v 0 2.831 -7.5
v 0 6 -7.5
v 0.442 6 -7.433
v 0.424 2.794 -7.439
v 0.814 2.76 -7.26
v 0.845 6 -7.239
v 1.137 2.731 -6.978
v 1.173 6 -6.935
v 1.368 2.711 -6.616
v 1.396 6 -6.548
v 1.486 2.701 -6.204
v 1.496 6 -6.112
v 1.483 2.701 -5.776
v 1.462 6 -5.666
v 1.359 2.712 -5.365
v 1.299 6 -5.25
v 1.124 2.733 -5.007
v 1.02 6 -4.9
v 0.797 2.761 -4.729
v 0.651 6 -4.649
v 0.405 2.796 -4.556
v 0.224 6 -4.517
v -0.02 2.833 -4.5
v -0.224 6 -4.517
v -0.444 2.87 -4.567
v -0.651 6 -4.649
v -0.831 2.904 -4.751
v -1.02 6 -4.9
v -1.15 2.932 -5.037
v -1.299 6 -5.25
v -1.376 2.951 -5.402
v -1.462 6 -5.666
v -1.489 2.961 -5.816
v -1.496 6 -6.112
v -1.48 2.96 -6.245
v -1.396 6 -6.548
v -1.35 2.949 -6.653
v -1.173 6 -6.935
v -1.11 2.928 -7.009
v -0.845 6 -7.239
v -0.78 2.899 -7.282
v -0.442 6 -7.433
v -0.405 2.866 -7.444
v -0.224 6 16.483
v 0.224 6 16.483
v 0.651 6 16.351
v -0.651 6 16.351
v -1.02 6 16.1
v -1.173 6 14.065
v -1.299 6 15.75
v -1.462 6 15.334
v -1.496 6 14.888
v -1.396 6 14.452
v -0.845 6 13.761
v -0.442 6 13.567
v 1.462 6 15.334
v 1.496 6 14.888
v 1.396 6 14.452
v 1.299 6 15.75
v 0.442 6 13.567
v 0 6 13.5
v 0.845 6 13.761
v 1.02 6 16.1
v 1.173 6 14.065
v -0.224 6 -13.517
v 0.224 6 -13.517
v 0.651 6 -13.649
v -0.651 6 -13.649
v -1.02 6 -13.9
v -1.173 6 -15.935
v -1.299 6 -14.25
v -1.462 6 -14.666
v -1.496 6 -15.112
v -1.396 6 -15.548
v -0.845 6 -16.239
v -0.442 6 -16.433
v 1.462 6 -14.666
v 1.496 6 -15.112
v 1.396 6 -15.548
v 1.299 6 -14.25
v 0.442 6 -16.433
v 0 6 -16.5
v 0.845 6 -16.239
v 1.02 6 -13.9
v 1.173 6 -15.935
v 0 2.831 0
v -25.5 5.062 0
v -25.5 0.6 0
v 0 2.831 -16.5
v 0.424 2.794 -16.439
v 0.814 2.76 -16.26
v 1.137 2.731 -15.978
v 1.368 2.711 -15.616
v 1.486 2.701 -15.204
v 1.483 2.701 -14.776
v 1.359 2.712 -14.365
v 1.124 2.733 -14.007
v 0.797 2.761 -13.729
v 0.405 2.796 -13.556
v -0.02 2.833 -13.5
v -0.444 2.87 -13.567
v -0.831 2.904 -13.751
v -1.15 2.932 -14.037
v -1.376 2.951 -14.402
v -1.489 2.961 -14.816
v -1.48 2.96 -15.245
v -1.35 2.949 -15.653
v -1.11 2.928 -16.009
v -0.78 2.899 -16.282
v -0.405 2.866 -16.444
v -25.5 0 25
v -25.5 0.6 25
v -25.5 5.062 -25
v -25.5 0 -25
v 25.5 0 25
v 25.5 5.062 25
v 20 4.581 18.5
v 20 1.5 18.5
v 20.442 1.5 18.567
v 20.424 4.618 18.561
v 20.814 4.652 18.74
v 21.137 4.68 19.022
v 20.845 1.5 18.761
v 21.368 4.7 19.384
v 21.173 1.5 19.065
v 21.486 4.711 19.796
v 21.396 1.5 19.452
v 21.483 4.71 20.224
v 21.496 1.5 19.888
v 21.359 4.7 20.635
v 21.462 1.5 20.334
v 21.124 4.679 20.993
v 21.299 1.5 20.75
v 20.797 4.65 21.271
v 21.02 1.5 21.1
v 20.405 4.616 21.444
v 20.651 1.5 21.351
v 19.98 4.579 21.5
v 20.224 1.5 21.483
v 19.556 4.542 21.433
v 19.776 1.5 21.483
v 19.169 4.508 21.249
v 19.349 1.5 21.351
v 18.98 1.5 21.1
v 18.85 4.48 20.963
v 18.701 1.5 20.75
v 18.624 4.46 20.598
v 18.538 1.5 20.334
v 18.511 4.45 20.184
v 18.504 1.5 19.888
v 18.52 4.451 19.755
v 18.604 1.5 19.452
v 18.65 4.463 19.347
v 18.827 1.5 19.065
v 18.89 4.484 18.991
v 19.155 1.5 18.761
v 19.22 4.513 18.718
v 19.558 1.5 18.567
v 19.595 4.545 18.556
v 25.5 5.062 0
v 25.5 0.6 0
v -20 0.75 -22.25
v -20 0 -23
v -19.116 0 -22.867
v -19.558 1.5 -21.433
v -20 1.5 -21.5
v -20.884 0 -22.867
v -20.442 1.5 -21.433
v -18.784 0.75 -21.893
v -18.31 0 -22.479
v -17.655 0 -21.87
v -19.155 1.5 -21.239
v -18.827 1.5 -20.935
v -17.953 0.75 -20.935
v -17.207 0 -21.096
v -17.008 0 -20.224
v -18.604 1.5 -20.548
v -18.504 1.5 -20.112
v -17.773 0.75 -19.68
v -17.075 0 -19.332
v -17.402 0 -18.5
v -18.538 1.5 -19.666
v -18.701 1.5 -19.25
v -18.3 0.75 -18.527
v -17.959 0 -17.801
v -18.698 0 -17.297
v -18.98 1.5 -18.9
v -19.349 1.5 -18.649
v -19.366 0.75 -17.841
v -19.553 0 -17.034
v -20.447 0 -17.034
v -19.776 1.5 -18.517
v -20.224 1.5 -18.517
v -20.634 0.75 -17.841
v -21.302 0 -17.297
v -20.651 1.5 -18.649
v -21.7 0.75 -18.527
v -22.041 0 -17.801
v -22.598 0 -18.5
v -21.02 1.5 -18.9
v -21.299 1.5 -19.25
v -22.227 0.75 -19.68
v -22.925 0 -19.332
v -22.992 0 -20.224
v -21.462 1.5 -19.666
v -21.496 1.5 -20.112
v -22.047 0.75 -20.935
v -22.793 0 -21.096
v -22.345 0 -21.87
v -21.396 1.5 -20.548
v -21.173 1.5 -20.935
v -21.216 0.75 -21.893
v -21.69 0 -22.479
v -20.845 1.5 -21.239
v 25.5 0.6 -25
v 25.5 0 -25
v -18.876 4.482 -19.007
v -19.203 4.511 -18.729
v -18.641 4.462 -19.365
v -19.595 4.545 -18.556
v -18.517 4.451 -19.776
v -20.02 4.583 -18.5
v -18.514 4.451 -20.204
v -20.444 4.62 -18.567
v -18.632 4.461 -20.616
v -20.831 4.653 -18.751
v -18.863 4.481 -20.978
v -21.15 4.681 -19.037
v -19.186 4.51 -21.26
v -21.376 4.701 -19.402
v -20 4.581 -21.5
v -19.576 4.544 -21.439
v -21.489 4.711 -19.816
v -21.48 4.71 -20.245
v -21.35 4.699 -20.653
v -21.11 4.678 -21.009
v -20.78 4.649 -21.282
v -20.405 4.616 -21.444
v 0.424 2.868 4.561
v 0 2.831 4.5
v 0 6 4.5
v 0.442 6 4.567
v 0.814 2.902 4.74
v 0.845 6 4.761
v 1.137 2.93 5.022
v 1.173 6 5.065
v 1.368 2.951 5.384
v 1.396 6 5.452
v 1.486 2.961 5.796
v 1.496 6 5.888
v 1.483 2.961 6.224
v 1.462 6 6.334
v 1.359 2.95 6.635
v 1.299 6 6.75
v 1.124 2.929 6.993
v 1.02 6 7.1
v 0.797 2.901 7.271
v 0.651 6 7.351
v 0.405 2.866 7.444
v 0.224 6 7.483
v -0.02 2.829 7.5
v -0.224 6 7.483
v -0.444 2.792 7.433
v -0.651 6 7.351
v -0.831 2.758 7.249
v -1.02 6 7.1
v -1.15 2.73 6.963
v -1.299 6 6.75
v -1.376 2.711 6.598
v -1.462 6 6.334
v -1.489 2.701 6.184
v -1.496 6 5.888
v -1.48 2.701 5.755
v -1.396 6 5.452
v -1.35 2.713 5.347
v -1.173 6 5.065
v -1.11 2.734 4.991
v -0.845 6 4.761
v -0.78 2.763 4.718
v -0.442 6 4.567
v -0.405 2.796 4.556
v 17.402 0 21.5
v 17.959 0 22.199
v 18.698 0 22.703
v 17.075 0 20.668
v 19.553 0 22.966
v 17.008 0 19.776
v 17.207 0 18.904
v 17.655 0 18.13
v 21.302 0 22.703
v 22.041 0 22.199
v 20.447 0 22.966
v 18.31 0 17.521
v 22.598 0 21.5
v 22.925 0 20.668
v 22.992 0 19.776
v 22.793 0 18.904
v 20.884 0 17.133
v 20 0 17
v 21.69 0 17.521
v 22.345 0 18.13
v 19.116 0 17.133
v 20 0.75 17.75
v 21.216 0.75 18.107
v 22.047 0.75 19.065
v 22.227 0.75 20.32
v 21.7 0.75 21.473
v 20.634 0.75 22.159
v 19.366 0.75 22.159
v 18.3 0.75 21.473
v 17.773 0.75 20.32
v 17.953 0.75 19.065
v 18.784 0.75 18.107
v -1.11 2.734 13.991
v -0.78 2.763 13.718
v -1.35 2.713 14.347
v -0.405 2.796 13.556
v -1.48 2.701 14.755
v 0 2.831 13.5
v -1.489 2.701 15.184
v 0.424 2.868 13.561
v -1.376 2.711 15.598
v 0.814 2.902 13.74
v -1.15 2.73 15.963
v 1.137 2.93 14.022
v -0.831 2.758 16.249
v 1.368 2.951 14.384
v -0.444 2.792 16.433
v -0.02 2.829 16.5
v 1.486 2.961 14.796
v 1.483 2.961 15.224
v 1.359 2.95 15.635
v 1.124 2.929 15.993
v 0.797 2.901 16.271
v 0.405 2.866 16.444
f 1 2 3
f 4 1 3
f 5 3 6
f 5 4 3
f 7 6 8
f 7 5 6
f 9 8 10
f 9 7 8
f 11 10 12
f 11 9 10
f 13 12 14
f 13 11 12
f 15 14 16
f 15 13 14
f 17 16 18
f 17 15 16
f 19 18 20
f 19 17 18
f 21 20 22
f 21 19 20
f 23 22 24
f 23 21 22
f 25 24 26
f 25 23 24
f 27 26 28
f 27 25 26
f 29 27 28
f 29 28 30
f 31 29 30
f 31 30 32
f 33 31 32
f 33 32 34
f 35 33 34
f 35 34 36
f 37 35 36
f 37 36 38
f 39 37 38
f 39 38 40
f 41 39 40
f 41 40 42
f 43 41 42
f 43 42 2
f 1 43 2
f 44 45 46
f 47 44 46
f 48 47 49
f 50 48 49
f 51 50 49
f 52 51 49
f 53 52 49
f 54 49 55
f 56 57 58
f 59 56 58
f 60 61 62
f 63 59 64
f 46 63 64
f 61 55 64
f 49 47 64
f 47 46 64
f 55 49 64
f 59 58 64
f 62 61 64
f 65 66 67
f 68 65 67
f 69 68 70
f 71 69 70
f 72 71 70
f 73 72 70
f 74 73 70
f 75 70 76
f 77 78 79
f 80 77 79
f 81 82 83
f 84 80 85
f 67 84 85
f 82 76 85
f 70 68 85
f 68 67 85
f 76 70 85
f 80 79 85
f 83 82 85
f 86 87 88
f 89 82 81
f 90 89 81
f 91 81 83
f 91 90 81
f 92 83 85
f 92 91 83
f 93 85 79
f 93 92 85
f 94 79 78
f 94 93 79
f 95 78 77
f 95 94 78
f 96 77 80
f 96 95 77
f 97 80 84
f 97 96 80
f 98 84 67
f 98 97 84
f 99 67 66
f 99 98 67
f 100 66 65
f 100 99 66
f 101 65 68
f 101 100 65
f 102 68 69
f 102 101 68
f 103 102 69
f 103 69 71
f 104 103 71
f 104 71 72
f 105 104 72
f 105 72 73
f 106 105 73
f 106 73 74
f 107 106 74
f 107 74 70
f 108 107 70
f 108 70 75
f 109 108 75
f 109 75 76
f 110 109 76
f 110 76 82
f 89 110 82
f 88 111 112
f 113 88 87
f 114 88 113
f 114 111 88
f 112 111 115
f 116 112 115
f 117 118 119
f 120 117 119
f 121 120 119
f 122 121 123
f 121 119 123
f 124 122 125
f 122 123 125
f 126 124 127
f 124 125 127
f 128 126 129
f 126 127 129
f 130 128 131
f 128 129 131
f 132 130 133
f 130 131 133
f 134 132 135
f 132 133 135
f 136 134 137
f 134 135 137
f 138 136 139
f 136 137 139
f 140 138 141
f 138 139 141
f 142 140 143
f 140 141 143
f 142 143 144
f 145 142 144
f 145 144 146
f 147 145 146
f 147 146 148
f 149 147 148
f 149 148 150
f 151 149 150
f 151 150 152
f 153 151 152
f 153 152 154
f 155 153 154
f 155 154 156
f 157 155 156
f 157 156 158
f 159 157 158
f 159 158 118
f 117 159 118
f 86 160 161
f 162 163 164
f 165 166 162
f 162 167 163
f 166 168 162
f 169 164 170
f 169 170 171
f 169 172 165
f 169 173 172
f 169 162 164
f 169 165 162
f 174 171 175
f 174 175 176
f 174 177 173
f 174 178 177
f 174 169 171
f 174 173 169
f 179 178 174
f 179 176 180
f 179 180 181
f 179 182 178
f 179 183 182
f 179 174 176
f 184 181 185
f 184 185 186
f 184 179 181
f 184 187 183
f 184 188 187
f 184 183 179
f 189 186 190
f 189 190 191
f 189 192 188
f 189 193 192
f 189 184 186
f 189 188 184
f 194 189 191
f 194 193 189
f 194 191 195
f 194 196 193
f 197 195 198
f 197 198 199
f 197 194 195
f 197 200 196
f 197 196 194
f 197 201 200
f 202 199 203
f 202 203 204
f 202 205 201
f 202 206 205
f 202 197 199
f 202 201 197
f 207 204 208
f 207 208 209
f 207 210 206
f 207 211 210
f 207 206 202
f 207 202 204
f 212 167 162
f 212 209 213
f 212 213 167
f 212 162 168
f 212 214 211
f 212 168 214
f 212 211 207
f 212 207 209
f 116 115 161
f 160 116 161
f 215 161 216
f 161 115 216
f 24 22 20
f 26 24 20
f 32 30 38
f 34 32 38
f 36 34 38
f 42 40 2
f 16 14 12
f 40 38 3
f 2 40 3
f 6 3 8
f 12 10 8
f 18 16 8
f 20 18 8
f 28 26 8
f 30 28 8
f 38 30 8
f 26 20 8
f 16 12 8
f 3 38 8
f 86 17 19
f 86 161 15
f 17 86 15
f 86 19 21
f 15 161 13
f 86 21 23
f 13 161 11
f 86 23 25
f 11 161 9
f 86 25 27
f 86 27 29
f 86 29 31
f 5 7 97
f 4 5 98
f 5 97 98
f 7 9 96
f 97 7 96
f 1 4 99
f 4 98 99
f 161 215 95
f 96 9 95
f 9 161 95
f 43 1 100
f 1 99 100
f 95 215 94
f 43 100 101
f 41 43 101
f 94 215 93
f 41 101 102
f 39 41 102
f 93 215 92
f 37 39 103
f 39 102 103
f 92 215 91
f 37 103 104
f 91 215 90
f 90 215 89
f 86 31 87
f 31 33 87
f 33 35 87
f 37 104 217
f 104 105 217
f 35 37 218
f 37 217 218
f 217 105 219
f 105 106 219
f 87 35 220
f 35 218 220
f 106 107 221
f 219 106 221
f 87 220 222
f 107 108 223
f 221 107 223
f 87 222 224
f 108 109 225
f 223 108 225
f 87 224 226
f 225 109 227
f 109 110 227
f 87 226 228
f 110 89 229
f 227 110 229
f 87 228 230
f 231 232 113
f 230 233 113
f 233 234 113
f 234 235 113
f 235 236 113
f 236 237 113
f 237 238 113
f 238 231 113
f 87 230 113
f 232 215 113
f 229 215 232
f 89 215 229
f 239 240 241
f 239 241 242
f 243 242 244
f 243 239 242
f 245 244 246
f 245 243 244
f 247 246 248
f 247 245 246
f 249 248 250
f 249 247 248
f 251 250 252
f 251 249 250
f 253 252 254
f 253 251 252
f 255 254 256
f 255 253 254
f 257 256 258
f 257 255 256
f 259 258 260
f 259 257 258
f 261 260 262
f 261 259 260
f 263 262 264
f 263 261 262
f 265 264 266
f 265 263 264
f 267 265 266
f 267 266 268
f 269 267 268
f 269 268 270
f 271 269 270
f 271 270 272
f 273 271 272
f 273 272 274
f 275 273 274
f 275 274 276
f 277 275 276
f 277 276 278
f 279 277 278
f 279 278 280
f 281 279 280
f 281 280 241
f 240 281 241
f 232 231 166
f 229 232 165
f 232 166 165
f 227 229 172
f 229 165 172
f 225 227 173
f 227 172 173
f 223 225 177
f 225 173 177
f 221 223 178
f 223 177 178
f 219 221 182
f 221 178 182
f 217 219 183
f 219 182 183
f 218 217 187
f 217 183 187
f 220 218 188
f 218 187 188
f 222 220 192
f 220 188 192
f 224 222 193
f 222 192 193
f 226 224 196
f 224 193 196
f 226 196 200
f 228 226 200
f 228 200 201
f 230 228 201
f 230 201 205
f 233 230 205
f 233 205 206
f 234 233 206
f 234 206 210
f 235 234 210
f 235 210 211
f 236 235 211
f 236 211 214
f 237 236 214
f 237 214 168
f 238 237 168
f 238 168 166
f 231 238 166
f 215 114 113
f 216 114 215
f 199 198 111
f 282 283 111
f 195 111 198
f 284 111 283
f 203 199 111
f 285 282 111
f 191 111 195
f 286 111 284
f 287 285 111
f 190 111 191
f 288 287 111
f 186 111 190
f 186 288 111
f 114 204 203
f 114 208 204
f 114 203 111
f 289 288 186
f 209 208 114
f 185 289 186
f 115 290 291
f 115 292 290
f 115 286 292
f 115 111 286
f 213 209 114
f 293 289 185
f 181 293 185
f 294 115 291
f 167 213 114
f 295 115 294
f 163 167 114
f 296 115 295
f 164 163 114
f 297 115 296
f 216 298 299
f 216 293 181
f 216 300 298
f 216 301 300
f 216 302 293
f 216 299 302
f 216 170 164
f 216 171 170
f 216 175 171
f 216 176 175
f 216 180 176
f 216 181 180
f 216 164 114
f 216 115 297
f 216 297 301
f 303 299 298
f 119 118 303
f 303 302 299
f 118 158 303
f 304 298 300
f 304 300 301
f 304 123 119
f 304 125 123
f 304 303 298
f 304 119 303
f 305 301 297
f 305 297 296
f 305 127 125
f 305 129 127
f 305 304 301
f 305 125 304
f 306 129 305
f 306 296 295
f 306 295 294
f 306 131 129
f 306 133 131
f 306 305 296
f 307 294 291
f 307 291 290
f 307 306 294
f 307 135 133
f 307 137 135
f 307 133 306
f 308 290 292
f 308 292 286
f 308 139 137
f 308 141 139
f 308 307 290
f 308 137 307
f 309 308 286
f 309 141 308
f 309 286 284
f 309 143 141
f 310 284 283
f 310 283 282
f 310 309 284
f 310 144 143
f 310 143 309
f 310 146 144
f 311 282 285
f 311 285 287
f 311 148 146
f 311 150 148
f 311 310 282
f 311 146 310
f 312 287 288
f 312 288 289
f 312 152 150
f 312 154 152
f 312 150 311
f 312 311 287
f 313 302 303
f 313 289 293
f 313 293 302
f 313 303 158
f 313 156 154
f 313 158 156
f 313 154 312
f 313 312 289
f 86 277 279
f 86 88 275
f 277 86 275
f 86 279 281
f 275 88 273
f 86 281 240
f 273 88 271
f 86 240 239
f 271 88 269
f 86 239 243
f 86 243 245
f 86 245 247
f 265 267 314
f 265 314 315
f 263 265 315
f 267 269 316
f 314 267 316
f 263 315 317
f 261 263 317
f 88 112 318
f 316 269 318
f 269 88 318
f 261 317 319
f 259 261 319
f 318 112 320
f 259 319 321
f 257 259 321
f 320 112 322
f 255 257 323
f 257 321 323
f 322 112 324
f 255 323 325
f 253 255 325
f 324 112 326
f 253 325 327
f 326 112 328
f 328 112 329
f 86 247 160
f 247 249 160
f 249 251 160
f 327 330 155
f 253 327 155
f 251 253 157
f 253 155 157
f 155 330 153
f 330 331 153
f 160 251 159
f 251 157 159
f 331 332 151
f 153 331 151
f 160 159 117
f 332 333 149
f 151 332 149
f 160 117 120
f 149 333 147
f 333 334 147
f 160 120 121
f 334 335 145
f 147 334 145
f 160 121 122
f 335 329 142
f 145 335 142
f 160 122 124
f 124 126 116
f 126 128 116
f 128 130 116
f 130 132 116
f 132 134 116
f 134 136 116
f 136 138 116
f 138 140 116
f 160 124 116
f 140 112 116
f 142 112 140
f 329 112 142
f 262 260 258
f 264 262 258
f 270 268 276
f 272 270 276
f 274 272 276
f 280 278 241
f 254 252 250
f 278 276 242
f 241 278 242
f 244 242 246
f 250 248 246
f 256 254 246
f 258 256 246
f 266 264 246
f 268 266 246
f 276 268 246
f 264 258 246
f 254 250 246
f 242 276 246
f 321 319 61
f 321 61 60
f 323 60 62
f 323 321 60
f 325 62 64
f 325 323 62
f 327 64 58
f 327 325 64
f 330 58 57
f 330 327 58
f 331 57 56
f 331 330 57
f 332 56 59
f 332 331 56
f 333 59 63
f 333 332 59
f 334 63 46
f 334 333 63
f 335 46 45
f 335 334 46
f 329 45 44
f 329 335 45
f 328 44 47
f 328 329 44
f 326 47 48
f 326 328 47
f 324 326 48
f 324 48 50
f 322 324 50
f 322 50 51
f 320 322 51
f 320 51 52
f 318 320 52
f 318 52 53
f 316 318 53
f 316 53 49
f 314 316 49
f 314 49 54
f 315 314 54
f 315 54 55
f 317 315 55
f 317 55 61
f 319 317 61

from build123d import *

# Parameters (mm, degrees)
ESBO_O2_W                = 51
ESBO_O2_H                = 50
RESSALTO_EXTRUS_O2_DEPTH = 6
CORTE_EXTRUS_O1_DEPTH    = 25
CORTE_EXTRUS_O3_DEPTH    = 25
ESBO_O5_R                = 1.5
RESSALTO_EXTRUS_O3_DEPTH = 6
ESBO_O8_R                = 1.5
CORTE_EXTRUS_O6_DEPTH    = 37.211186117
CHANFRO2_SIZE            = 1.5


with BuildPart() as part:
    # Esboço2 → Ressalto-extrusão2 (new body)
    with BuildSketch(Plane(origin=(0, 0, 0), x_dir=(1, 0, 0), z_dir=(0, 1, 0))):
        Rectangle(ESBO_O2_W, ESBO_O2_H)
    extrude(amount=RESSALTO_EXTRUS_O2_DEPTH)

    # Esboço3 → Corte-extrusão1 (cut)
    with BuildSketch(Plane.XY.offset(25)):
        Polygon((-25.5, 0.6), (25.5, 5.06192184), (25.5, 6), (-25.5, 6), align=None)
    extrude(amount=-CORTE_EXTRUS_O1_DEPTH, mode=Mode.SUBTRACT)

    # Esboço4 → Corte-extrusão3 (cut)
    with BuildSketch(Plane(origin=(0, 0, -25), x_dir=(-1, 0, 0), z_dir=(0, 0, -1))):
        Polygon((-25.5, 0.6), (25.5, 5.06192184), (25.5, 6), (-25.5, 6), align=None)
    extrude(amount=-CORTE_EXTRUS_O3_DEPTH, mode=Mode.SUBTRACT)

    # Esboço5 → Ressalto-extrusão3 (add)
    with BuildSketch(Plane.XZ):
        with Locations(Location((0, 6, 0), (0, 0, 270))):
            Circle(ESBO_O5_R)
        with Locations(Location((0, 15, 0), (0, 0, 270))):
            Circle(ESBO_O5_R)
        with Locations(Location((0, -15, 0), (0, 0, 270))):
            Circle(ESBO_O5_R)
        with Locations(Location((0, -6, 0), (0, 0, 270))):
            Circle(ESBO_O5_R)
    extrude(amount=-RESSALTO_EXTRUS_O3_DEPTH)

    # Esboço8 → Corte-extrusão6 (cut, through all)
    with BuildSketch(Plane.XZ):
        with Locations(Location((20, 20, 0), (0, 0, 270))):
            Circle(ESBO_O8_R)
        with Locations(Location((-20, -20, 0), (0, 0, 270))):
            Circle(ESBO_O8_R)
    extrude(amount=-CORTE_EXTRUS_O6_DEPTH, mode=Mode.SUBTRACT)

    # Chanfro2
    chanfro2_edges = [part.edges().sort_by_distance(p)[0] for p in [
        (20, 0, 21.5),
        (-20, 0, -18.5),
    ]]
    chamfer(chanfro2_edges, length=CHANFRO2_SIZE)


solid = part.part
